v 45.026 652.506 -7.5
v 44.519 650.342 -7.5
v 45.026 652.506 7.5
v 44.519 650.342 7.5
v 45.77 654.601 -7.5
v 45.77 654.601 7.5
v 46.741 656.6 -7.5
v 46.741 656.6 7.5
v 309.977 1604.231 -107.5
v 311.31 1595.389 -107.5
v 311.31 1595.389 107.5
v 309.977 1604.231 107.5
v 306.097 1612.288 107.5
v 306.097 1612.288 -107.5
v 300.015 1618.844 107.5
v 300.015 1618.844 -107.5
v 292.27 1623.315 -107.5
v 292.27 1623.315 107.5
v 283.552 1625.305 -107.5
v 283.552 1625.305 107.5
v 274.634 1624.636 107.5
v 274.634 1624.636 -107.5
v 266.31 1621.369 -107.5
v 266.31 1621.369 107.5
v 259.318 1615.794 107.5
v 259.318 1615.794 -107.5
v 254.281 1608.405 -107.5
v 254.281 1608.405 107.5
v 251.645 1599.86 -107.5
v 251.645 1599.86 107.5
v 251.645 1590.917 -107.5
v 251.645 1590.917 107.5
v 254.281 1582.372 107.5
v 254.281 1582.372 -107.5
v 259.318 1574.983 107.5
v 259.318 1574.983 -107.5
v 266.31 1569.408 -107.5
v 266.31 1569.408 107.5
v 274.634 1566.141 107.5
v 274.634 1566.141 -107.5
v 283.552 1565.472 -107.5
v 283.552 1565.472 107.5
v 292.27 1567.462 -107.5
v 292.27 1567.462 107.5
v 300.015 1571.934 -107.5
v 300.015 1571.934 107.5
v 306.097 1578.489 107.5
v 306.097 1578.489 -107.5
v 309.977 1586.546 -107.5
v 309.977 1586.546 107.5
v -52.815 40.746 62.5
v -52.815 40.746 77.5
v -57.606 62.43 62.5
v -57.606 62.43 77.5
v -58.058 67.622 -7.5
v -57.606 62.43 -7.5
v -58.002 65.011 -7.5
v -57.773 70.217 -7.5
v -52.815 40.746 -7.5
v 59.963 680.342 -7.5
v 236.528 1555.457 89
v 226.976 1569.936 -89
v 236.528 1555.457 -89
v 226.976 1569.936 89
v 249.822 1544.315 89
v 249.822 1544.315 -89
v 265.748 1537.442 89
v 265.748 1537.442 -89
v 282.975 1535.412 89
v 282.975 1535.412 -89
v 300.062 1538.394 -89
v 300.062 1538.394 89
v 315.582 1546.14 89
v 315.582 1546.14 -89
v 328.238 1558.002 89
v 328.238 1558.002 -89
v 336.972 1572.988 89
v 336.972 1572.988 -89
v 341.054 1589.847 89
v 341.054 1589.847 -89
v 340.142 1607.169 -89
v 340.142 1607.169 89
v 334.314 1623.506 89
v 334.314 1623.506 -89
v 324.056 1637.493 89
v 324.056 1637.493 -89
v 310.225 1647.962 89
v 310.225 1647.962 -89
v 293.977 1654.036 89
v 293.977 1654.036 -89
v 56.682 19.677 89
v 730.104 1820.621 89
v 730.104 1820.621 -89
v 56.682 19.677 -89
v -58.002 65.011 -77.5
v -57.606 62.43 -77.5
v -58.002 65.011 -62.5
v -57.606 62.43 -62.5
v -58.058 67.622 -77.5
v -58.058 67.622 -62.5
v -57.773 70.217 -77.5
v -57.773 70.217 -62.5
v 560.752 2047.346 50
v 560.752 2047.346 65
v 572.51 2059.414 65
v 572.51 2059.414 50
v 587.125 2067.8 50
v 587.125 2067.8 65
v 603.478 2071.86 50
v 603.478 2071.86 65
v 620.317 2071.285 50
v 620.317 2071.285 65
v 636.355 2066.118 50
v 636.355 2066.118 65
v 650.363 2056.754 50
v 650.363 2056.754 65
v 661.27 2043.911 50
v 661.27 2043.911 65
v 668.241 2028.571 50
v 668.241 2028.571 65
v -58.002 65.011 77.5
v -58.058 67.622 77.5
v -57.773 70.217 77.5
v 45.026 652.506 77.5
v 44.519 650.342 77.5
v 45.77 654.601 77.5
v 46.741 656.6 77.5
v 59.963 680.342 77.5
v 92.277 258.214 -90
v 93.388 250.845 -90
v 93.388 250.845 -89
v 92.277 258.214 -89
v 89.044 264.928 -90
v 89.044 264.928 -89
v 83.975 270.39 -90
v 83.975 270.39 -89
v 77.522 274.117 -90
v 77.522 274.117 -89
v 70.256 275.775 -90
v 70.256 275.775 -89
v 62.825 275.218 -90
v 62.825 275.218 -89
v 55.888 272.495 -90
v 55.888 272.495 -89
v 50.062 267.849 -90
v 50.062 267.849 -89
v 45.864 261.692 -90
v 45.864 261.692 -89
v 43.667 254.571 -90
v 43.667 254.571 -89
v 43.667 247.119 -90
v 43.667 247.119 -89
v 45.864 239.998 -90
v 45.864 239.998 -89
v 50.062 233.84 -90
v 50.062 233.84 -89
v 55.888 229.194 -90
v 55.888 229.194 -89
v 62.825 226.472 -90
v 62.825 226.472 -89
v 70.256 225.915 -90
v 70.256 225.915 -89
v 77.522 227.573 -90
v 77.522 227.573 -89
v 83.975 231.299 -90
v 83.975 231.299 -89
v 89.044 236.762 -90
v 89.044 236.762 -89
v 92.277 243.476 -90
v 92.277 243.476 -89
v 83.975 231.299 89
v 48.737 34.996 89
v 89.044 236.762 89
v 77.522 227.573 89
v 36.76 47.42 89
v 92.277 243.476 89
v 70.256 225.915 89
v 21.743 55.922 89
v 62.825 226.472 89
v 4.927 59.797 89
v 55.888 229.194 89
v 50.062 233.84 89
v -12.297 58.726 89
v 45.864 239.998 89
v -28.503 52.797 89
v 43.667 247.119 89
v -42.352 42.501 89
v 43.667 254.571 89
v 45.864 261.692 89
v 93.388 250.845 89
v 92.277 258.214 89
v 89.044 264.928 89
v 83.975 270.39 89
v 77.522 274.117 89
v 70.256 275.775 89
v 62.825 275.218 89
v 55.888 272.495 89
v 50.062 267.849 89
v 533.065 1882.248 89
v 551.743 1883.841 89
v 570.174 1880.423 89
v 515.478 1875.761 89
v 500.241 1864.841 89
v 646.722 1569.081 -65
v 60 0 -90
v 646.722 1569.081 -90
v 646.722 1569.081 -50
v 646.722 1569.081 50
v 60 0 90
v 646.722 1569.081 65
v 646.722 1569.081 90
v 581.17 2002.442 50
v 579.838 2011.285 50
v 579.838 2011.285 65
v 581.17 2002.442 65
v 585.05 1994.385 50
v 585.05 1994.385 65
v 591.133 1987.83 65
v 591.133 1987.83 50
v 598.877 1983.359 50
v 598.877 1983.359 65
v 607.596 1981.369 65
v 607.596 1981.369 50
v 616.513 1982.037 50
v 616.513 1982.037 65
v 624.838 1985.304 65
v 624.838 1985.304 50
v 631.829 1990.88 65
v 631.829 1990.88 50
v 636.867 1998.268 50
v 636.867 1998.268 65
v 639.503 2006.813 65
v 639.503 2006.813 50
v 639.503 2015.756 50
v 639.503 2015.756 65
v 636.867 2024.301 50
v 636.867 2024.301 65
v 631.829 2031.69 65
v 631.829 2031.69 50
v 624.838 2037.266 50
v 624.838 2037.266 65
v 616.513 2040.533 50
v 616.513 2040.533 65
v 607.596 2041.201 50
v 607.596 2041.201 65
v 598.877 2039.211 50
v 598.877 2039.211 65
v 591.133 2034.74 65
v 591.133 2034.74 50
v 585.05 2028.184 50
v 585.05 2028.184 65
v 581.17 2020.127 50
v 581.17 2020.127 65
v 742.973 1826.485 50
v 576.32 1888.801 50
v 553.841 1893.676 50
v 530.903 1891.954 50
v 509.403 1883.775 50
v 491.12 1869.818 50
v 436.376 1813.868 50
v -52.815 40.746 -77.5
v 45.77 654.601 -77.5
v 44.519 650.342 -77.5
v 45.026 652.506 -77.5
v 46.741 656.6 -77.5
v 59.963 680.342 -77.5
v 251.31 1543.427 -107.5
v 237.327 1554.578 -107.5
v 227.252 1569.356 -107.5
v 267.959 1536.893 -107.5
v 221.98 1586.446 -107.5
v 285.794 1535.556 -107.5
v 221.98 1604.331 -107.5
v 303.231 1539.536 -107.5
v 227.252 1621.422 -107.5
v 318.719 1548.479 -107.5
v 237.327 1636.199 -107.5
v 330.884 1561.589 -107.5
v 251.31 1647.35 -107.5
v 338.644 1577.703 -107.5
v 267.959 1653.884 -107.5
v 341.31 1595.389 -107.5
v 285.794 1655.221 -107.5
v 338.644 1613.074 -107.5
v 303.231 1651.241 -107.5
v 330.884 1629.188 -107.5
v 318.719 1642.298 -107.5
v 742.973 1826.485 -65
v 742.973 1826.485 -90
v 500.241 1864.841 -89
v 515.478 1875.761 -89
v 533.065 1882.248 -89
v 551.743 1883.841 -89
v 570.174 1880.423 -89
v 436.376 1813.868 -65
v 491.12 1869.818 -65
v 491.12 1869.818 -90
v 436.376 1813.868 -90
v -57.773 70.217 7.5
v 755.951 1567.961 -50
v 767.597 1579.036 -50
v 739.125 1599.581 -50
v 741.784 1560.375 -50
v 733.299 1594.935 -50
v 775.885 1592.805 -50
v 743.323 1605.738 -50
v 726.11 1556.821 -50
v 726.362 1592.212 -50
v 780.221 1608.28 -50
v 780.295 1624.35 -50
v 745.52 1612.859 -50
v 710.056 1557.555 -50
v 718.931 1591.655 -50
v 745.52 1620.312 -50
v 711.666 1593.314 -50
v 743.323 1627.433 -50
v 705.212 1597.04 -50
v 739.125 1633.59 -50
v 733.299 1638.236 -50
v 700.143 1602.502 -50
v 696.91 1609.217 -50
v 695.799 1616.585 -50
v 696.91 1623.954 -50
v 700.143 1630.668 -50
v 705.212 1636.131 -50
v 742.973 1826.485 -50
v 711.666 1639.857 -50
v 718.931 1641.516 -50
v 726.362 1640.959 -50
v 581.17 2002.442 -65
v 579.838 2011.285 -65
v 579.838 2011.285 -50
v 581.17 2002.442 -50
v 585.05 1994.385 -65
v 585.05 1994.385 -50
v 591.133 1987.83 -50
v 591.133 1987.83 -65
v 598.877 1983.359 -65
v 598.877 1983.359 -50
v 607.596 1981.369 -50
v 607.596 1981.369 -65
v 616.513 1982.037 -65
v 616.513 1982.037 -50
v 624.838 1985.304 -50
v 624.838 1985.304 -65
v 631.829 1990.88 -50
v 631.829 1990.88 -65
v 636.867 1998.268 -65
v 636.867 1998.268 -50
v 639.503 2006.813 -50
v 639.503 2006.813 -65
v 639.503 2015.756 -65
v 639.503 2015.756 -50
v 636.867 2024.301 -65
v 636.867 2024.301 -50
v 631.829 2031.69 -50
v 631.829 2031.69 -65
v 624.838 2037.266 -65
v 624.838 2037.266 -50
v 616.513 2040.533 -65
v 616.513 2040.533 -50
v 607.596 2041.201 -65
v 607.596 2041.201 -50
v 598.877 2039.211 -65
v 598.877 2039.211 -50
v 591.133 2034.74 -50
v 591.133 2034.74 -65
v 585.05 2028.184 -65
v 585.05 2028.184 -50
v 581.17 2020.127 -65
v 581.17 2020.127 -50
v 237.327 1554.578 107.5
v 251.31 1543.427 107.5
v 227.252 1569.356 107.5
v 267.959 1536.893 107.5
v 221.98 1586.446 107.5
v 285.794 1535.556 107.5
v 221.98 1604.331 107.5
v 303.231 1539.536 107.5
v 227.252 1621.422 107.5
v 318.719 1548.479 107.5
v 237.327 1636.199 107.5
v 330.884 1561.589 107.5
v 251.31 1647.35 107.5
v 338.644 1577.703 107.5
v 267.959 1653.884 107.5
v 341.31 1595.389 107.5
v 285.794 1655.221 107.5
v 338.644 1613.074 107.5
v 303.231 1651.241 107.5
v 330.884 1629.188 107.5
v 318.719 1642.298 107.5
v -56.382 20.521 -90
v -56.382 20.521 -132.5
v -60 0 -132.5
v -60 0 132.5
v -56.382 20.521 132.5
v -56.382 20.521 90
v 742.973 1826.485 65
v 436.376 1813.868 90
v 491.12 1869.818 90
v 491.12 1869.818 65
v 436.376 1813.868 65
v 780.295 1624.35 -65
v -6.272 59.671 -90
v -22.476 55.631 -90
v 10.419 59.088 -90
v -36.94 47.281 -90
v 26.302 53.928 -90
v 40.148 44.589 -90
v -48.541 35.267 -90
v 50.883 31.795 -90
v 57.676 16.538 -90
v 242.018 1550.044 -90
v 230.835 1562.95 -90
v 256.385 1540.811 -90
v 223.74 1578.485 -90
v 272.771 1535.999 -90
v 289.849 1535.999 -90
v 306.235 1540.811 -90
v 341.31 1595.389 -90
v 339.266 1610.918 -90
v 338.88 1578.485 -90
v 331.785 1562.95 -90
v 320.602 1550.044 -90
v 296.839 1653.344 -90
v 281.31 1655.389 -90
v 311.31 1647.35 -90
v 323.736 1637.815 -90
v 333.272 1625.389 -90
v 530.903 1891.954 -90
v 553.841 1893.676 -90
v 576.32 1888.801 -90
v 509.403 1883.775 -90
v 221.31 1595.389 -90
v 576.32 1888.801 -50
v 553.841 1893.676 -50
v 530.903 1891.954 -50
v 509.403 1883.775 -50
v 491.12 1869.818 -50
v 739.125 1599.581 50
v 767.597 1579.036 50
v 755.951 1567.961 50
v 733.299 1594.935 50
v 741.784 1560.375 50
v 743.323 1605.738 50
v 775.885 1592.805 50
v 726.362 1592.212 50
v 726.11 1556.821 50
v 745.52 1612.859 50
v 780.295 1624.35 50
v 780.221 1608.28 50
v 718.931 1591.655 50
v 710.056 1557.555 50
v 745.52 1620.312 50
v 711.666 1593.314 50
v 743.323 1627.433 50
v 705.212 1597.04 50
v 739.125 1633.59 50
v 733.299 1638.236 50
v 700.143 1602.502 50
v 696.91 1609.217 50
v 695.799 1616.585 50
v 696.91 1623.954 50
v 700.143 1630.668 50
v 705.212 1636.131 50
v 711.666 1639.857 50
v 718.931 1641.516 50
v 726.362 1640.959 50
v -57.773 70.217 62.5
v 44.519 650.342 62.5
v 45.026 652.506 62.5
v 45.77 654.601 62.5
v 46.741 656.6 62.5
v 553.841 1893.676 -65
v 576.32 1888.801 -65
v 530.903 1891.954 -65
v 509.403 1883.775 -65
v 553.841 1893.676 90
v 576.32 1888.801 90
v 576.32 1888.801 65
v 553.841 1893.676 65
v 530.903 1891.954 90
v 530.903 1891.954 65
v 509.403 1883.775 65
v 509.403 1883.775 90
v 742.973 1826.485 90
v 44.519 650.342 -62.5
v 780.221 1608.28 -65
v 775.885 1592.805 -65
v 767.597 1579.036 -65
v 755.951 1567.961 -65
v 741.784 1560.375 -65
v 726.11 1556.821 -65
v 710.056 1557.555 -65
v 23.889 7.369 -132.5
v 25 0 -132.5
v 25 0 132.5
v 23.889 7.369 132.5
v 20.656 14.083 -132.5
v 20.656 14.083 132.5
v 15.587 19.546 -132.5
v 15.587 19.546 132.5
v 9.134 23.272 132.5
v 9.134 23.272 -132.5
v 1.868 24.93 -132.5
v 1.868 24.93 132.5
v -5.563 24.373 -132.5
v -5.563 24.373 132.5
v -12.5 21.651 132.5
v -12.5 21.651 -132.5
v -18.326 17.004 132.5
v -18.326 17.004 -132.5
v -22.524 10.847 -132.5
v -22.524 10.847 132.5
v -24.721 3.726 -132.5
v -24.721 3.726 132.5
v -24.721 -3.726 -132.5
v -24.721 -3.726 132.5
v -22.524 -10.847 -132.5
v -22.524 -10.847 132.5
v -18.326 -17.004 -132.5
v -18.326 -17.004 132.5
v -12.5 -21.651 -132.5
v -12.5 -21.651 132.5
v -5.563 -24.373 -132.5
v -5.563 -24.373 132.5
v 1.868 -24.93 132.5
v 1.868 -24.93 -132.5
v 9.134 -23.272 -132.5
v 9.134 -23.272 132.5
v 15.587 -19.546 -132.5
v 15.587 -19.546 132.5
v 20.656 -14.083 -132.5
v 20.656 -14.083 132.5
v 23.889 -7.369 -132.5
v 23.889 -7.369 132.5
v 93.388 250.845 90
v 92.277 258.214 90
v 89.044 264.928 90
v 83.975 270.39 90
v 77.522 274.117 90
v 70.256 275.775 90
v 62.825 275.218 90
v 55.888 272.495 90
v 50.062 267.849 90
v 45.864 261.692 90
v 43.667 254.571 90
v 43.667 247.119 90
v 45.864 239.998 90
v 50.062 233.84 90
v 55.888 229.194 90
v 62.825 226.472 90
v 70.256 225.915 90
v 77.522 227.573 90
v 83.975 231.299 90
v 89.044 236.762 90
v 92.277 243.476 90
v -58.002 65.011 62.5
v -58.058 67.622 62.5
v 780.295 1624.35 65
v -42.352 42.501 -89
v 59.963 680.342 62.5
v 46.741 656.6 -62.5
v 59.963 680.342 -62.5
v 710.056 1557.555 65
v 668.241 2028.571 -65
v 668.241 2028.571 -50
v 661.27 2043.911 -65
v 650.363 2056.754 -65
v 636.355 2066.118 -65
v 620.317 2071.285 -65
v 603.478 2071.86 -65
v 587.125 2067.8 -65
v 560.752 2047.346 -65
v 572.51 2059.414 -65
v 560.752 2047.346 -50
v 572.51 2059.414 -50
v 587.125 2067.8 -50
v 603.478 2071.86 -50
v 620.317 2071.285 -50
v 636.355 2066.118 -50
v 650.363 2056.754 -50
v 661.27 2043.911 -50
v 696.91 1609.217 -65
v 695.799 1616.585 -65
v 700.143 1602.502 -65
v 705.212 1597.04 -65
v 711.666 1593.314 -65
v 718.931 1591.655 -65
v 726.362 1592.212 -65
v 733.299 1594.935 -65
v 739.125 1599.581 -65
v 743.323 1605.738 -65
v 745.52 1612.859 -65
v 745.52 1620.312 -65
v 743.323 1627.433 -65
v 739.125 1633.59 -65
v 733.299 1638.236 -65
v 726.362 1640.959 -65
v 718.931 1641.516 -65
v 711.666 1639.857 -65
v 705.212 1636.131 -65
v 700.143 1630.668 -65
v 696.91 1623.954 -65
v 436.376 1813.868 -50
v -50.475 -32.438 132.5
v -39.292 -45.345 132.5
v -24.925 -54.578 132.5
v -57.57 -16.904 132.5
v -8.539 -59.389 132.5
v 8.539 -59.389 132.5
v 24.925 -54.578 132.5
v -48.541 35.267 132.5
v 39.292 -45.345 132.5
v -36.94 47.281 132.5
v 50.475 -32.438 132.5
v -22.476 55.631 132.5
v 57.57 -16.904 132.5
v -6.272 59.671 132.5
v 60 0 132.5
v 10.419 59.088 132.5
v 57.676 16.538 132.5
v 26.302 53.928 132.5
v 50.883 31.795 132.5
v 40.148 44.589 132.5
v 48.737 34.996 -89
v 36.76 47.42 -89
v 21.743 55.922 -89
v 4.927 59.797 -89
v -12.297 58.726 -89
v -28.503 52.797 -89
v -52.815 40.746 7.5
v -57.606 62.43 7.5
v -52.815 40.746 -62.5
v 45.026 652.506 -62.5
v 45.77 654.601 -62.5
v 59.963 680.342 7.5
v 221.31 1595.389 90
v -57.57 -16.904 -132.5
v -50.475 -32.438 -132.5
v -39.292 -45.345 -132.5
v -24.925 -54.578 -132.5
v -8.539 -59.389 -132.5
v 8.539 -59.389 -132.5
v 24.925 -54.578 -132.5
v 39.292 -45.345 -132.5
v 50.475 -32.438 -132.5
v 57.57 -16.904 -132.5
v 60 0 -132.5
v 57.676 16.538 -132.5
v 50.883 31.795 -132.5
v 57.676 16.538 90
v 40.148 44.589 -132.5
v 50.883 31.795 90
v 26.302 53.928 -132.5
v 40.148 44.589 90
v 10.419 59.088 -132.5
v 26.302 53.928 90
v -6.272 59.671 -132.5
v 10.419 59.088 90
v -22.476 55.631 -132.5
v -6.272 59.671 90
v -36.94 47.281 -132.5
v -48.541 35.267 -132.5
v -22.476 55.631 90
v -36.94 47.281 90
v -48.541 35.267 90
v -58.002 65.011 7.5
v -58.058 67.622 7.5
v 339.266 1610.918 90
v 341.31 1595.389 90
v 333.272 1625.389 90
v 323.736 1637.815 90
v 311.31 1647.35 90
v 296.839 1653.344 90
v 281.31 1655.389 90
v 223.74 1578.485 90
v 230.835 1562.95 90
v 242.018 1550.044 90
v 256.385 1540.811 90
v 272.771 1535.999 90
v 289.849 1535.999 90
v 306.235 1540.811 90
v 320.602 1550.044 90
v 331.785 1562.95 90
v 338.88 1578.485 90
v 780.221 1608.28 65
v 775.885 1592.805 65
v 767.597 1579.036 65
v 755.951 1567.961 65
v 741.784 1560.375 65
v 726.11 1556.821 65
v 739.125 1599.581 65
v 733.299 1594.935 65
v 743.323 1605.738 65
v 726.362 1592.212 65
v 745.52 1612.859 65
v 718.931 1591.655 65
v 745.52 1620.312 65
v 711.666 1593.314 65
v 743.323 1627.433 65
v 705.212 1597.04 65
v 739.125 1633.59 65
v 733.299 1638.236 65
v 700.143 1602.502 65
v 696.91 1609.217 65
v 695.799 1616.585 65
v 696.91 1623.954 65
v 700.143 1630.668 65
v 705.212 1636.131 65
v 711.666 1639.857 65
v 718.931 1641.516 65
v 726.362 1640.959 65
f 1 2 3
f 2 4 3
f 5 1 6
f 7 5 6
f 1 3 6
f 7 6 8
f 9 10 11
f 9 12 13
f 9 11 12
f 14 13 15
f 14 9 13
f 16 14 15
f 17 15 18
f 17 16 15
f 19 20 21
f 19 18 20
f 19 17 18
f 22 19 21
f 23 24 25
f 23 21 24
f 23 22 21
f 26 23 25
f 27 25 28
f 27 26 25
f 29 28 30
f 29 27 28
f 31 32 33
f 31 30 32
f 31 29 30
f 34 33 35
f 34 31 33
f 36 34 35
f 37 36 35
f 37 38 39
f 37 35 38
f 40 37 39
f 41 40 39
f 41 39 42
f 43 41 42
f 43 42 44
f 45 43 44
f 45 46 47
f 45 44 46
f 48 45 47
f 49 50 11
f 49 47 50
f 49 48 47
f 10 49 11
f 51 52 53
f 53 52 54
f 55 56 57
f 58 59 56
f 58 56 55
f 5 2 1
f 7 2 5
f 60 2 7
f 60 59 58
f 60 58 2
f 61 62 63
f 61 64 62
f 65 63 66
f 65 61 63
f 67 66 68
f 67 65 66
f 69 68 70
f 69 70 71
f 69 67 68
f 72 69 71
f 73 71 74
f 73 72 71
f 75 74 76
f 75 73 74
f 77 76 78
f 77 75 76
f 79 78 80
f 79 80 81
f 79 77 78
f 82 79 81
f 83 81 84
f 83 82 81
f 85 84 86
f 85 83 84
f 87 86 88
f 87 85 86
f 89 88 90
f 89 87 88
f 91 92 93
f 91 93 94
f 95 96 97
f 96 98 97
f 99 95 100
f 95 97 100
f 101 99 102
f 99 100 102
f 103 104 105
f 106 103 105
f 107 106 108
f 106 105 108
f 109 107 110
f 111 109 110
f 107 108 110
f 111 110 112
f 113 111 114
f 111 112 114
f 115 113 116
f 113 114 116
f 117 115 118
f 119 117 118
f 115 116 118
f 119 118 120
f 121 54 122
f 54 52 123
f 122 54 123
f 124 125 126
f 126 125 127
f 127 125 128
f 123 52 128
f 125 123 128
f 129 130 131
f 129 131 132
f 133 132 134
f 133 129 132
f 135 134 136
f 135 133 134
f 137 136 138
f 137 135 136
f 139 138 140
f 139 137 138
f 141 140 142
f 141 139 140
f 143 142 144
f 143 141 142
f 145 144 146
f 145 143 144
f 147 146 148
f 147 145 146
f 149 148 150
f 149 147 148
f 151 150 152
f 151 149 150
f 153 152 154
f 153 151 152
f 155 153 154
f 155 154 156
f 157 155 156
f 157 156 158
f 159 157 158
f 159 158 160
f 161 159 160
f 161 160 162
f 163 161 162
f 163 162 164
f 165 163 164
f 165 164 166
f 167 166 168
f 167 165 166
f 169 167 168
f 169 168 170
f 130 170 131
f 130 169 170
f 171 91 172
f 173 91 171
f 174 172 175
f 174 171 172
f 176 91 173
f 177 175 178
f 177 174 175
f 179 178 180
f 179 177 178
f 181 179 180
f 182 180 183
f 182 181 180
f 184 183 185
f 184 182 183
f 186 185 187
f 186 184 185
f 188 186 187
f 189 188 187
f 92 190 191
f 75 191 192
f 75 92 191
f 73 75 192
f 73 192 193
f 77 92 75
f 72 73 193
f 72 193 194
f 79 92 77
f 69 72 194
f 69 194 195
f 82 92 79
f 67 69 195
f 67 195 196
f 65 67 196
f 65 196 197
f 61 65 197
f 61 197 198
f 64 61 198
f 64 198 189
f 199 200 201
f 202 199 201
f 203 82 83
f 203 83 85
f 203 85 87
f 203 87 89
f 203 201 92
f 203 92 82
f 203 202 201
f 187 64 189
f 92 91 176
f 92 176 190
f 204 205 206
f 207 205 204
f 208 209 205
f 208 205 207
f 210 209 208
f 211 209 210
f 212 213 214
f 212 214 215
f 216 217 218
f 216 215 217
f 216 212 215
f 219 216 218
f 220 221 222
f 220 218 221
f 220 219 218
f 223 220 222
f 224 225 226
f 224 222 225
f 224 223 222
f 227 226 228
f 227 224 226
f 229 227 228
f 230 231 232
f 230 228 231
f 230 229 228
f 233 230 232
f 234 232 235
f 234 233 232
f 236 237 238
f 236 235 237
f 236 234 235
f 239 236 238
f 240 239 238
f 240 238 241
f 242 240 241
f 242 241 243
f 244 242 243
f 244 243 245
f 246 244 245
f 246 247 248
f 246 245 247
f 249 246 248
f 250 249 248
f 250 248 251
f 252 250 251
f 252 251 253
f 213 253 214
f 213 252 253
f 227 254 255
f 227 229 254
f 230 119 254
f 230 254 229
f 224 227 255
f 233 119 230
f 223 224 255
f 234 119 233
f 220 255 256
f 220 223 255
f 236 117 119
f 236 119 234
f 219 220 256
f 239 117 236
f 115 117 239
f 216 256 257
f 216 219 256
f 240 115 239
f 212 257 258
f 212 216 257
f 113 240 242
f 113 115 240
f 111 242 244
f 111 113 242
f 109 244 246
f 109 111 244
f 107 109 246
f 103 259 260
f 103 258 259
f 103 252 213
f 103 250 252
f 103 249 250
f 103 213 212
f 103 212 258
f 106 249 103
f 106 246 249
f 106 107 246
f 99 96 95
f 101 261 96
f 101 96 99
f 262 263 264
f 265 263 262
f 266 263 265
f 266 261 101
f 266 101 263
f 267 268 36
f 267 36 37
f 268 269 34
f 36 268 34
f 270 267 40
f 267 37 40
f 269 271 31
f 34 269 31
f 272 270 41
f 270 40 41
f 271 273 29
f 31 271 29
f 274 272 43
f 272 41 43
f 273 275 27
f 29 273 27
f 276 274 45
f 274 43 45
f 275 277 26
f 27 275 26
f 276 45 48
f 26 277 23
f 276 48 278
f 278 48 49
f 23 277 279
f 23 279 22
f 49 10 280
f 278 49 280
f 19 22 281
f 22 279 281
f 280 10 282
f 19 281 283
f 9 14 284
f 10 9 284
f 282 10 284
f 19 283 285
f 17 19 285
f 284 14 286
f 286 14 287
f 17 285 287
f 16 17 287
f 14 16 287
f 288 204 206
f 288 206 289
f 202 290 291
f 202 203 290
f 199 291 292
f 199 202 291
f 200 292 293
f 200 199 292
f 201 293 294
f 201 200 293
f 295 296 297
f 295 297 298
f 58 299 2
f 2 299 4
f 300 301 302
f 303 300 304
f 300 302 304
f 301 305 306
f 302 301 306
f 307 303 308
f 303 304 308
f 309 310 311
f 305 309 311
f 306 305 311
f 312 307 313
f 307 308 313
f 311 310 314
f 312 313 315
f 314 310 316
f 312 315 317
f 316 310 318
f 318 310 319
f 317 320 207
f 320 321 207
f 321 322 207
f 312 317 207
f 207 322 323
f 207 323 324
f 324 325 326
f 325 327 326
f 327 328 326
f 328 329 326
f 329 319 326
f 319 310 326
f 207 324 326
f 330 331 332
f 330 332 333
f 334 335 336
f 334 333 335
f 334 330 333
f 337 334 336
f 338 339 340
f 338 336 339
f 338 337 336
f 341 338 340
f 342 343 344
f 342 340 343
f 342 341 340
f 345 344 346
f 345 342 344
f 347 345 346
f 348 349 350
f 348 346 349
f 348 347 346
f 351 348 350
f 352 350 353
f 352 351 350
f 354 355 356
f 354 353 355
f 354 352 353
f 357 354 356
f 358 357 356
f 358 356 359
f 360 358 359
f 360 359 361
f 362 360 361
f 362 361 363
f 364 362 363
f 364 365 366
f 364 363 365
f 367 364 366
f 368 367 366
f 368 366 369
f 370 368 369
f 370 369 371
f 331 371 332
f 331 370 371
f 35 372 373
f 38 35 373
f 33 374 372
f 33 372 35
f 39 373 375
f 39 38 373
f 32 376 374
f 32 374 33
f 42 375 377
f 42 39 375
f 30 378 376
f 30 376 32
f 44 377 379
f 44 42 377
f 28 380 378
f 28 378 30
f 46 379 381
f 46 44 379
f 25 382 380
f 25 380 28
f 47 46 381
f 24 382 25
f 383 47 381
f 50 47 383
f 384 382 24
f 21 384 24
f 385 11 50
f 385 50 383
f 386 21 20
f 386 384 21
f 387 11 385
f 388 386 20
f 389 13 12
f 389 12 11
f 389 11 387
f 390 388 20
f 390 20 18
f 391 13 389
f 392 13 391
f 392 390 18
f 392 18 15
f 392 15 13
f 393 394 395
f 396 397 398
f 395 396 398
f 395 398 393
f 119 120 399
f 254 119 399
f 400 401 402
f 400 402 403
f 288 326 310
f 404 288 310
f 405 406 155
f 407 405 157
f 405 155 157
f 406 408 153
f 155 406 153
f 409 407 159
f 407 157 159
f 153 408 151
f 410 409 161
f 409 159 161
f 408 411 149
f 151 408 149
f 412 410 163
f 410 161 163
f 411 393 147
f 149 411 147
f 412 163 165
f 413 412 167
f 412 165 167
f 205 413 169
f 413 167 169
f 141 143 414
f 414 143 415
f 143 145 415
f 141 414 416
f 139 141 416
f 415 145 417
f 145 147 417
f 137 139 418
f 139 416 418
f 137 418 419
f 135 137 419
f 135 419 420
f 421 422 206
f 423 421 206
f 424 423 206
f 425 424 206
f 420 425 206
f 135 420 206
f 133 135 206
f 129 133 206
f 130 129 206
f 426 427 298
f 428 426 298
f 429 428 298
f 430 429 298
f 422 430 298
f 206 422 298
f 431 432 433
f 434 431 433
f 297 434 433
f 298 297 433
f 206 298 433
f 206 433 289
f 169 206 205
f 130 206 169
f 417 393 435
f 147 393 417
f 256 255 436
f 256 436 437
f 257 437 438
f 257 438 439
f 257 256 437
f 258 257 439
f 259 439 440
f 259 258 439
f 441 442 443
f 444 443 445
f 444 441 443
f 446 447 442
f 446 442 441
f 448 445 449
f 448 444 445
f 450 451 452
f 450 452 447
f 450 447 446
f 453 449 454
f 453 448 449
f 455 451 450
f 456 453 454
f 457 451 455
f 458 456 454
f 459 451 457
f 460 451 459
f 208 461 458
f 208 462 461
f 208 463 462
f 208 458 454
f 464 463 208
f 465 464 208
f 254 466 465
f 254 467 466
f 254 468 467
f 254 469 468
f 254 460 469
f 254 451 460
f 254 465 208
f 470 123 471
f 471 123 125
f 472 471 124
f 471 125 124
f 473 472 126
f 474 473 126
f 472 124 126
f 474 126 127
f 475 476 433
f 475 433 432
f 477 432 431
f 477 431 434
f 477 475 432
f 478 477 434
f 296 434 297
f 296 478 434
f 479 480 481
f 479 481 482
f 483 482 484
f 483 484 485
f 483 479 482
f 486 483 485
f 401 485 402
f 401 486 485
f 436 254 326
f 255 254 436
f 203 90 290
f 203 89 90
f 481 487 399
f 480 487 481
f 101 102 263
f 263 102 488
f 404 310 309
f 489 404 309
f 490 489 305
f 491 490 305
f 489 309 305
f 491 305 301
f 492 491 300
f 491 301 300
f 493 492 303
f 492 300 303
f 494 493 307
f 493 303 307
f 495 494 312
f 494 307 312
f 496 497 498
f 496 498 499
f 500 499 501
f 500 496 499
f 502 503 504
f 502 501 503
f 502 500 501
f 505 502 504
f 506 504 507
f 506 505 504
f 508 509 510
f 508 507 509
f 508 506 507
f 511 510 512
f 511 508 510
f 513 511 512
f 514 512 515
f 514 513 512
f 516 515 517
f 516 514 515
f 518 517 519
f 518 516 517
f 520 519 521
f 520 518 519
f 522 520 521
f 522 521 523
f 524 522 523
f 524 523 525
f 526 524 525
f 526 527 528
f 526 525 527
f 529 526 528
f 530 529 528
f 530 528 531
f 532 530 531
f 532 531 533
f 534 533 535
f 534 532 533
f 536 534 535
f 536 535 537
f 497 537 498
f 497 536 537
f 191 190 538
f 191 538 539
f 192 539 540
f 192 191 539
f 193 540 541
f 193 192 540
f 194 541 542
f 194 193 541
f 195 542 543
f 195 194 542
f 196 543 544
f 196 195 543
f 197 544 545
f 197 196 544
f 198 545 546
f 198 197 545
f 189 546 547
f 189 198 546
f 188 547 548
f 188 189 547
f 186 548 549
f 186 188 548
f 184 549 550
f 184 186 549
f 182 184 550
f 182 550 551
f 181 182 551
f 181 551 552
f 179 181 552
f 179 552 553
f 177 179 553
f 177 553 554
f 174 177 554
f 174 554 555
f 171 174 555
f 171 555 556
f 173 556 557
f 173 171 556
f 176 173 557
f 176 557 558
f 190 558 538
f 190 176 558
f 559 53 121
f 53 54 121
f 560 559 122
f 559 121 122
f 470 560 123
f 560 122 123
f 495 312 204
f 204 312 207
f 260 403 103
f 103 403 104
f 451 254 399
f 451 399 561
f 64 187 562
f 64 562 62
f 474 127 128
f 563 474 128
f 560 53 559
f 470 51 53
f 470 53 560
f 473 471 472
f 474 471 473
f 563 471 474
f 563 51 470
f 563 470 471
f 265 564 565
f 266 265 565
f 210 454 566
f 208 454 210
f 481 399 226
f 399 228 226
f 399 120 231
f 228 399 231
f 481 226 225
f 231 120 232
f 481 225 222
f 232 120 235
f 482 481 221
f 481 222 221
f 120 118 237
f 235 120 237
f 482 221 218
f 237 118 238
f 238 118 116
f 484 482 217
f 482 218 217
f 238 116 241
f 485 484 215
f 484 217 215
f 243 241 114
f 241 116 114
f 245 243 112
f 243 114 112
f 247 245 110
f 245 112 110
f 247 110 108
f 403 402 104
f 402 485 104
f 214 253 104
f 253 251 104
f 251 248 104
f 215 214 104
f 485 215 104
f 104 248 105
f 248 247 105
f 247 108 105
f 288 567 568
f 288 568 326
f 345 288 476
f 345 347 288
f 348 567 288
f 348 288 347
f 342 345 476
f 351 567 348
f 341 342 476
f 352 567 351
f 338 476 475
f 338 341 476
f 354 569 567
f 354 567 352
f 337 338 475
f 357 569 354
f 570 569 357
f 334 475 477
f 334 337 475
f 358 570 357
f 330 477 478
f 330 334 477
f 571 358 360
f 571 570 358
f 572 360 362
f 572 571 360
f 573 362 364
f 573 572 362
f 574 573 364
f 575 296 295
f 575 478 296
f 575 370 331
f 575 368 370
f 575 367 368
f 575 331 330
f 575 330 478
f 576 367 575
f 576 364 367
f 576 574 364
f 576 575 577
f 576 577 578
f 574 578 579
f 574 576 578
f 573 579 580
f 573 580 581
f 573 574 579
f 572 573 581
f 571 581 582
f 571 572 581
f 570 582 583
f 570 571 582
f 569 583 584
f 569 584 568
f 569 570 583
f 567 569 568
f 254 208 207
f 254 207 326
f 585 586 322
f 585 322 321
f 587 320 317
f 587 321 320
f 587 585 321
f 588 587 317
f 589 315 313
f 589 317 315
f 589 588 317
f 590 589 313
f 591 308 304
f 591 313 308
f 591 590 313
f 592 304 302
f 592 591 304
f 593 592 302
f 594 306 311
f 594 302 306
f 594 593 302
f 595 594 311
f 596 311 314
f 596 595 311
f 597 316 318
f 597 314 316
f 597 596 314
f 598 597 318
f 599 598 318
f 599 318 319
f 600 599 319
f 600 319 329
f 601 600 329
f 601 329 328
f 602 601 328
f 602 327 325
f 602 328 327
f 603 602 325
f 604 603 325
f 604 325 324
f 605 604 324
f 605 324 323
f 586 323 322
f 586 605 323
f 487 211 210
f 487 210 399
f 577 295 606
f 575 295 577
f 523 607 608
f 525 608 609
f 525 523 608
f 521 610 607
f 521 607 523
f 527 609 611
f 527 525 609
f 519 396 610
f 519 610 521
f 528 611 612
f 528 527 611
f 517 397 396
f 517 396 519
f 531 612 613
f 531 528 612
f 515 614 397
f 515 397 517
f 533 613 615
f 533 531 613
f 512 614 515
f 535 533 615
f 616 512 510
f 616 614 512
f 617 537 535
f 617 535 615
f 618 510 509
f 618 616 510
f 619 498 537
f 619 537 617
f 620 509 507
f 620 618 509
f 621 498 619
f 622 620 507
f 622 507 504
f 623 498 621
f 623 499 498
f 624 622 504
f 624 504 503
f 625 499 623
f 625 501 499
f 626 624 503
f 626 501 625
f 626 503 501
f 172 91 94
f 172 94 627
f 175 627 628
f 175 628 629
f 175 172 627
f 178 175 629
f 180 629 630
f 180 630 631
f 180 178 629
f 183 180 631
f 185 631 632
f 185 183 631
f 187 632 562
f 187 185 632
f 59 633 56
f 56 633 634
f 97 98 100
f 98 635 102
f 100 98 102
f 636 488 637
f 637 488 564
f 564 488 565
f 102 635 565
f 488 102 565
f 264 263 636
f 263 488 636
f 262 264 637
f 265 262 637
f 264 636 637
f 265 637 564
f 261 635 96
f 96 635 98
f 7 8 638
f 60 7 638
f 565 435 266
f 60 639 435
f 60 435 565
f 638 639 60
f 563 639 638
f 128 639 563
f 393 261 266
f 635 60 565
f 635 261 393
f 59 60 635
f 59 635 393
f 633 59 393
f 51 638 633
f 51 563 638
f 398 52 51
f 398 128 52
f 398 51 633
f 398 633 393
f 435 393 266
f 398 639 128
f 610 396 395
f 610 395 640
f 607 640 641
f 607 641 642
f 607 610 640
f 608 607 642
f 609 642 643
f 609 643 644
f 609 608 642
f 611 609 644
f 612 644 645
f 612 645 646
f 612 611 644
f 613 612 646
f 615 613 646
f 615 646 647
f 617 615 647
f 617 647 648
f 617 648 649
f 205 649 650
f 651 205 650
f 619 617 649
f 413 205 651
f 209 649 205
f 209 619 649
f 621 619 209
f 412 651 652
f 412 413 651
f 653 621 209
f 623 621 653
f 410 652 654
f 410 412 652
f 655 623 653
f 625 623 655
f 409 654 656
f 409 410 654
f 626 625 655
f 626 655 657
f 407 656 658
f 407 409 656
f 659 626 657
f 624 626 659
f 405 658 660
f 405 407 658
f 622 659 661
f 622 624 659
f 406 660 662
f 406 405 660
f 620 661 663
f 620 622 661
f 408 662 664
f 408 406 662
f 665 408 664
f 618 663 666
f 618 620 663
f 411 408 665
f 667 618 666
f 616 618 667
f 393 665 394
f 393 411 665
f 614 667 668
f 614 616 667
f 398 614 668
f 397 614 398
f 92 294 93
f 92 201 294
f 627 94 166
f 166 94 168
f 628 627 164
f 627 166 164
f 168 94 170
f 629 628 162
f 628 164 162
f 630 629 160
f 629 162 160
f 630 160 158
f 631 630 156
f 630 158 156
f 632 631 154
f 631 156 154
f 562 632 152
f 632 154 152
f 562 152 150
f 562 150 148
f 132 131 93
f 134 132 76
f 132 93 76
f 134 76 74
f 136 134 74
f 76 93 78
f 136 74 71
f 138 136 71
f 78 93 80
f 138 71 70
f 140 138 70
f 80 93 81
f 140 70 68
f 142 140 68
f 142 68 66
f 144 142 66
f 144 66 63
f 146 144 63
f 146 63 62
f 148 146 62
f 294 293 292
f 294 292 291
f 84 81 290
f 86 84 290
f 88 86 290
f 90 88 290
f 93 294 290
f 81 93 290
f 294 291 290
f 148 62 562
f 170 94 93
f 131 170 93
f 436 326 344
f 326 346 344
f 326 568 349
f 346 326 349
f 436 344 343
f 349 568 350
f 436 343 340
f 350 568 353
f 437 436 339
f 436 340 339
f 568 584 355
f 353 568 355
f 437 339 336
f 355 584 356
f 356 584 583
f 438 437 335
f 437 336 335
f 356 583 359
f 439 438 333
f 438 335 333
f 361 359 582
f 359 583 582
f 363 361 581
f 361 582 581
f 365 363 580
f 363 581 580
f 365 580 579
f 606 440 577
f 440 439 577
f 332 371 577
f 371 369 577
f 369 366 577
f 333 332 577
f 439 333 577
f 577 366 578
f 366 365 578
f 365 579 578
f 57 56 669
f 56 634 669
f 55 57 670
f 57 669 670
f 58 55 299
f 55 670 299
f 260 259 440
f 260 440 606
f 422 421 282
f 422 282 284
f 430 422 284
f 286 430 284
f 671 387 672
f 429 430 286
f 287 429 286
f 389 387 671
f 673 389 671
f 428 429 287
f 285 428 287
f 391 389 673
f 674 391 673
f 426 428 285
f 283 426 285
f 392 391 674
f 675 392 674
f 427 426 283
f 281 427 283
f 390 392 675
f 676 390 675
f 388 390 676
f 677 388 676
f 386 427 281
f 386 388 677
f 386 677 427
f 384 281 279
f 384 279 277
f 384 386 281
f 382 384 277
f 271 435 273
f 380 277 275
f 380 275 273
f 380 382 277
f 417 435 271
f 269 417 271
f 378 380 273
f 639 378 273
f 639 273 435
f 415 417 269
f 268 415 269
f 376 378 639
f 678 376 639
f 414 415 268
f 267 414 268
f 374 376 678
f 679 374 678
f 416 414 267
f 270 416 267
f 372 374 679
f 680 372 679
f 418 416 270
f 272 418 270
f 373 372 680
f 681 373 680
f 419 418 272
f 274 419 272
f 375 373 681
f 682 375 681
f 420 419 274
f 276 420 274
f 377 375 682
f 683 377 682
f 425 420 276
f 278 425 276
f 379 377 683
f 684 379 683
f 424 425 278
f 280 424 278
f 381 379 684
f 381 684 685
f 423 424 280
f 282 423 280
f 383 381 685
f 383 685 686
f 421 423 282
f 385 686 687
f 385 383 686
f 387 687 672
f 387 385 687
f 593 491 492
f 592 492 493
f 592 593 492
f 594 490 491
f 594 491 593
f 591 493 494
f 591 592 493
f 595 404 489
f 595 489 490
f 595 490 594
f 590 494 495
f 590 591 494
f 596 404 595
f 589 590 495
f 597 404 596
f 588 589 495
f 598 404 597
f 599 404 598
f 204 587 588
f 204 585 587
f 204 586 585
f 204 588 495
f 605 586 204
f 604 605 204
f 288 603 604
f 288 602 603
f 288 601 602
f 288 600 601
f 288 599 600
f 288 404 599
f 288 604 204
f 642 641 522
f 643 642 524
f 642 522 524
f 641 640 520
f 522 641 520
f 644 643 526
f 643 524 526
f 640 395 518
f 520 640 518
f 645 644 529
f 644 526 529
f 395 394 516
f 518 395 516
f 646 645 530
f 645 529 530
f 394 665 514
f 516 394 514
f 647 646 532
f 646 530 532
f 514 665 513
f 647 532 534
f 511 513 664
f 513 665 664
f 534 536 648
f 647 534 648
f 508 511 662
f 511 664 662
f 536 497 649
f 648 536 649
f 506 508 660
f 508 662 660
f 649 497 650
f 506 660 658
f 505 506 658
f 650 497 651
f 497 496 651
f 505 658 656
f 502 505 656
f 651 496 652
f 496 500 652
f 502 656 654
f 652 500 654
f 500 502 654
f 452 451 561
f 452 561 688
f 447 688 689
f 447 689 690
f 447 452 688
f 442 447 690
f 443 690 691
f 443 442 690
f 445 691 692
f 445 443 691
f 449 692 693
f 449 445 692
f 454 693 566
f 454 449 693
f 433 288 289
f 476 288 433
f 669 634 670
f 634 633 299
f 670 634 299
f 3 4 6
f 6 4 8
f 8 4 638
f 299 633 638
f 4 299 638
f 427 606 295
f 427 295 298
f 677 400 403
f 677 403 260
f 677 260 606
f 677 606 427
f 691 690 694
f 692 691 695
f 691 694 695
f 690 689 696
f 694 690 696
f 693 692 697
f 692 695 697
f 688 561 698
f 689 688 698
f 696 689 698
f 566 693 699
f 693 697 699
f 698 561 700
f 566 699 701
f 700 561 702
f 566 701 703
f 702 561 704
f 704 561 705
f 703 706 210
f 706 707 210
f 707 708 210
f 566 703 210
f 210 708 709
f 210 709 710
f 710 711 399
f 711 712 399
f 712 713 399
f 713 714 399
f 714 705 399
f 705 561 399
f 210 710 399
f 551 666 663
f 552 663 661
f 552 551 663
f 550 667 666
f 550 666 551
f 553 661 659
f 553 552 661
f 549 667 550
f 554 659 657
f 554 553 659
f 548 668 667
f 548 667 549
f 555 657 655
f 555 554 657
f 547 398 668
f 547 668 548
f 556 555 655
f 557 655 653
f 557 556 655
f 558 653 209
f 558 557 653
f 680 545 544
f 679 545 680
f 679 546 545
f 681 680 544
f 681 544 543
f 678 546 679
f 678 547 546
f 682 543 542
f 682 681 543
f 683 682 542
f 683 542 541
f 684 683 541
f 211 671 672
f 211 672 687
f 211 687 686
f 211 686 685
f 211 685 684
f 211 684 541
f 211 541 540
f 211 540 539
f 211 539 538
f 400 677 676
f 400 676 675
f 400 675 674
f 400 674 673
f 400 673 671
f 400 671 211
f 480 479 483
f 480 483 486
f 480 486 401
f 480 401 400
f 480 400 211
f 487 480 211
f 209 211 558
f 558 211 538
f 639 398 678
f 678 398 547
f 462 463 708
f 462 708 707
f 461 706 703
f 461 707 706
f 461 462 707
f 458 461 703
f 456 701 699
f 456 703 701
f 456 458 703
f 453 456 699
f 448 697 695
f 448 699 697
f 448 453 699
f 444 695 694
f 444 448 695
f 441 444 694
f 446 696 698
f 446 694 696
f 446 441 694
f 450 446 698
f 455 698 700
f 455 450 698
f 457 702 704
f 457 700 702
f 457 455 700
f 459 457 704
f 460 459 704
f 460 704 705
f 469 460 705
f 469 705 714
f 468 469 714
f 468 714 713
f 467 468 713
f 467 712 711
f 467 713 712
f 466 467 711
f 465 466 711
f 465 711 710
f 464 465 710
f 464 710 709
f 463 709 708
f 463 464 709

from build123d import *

# Parameters (mm, degrees)
BOSS_EXTRUDE7_DEPTH     = 132.5
BOSS_EXTRUDE8_DEPTH     = 107.5
BOSS_EXTRUDE11_DEPTH    = 90
BOSS_EXTRUDE13_DEPTH    = 15
BOSS_EXTRUDE14_DEPTH    = 15
CUT_EXTRUDE1_DEPTH      = 2219.3750456124794
CUT_EXTRUDE1_DEPTH_BACK = 2219.3750456124794
SKETCH9_R               = 25.00000000000001
CUT_EXTRUDE2_DEPTH      = 2219.3750456124794
CUT_EXTRUDE2_DEPTH_BACK = 2219.3750456124794
SKETCH10_R              = 25
SKETCH10_R_2            = 30.000000000000057
SKETCH10_R_3            = 25.00000000000001
CUT_EXTRUDE4_DEPTH      = 89
BOSS_EXTRUDE16_DEPTH    = 7.5
LPATTERN1_COUNT         = 2
LPATTERN1_PITCH         = 70
LPATTERN1_COUNT_DIR2    = 2
LPATTERN1_PITCH_DIR2    = 70


with BuildPart() as part:
    # Sketch1 → Boss-Extrude7 (new, symmetric)
    with BuildSketch(Plane.XY):
        with BuildLine():
            ThreePointArc((-60.00000000000001, 7.35e-15), (-1.102e-14, -60.00000000000001), (60.00000000000001, -1.47e-14))
            ThreePointArc((60.00000000000001, 0), (10.418890660014398, 59.08846518073274), (-56.3815572471555, 20.521208599537406))
            Line((-56.38155724715507, 20.5212085995373), (-60.00000000000001, 0))
        make_face()
    extrude(amount=BOSS_EXTRUDE7_DEPTH, both=True)



with BuildPart() as body_2:
    # Sketch1<4> → Boss-Extrude8 (new, symmetric)
    with BuildSketch(Plane.XY):
        with BuildLine():
            ThreePointArc((281.31004782042226, 1655.3885598797779), (238.8836409492294, 1637.8149667509708), (221.31004782042226, 1595.3885598797779))
            ThreePointArc((221.31004782042226, 1595.3885598797779), (281.31004782042226, 1535.3885598797779), (341.31004782042226, 1595.3885598797779))
            ThreePointArc((341.31004782042226, 1595.3885598797779), (323.7364546916151, 1637.8149667509706), (281.31004782042226, 1655.3885598797779))
        make_face()
    extrude(amount=BOSS_EXTRUDE8_DEPTH, both=True)


with BuildPart() as part_1:
    add(part.part)

    add(body_2.part)  # Boss-Extrude11 merges body 2
    # Sketch1<7> → Boss-Extrude11 (add, symmetric)
    with BuildSketch(Plane.XY):
        with BuildLine():
            ThreePointArc((-56.3815572471555, 20.521208599537406), (10.418890660014398, 59.08846518073274), (60.00000000000001, 0))
            Line((60.00000000000001, 0), (646.7224446980108, 1569.081173489734))
            Line((646.7224446980108, 1569.081173489734), (742.9728526854286, 1826.4851717149877))
            Line((742.9728526854286, 1826.4851717149877), (576.320357346008, 1888.8011061182426))
            ThreePointArc((576.320357346008, 1888.8011061182426), (530.9028583578195, 1891.9536301782764), (491.1198634823963, 1869.8176653013334))
            Line((491.1198634823963, 1869.8176653013334), (436.3758539114068, 1813.8683811248072))
            Line((436.3758539114068, 1813.8683811248072), (281.31004782042226, 1655.3885598797779))
            ThreePointArc((281.31004782042226, 1655.3885598797779), (323.7364546916151, 1637.8149667509706), (341.31004782042226, 1595.3885598797779))
            ThreePointArc((341.31004782042226, 1595.3885598797779), (281.31004782042226, 1535.3885598797779), (221.31004782042226, 1595.3885598797779))
            Line((221.3100478204223, 1595.3885598797783), (-56.38155724715507, 20.5212085995373))
        make_face()
    extrude(amount=BOSS_EXTRUDE11_DEPTH, both=True)

    # Sketch7 → Boss-Extrude13 (add)
    with BuildSketch(Plane.XY.offset(50)):
        with BuildLine():
            Line((491.11986348239617, 1869.8176653013334), (436.3758539114068, 1813.8683811248072))
            Line((436.3758539114068, 1813.8683811248072), (560.7517491875225, 2047.345886437859))
            ThreePointArc((560.7517491875225, 2047.345886437859), (620.3174364074071, 2071.284752328037), (668.241381159095, 2028.571336244537))
            Line((668.241381159095, 2028.571336244537), (742.9728526854286, 1826.4851717149877))
            Line((742.9728526854286, 1826.4851717149877), (576.320357346008, 1888.8011061182426))
            ThreePointArc((576.320357346008, 1888.8011061182426), (530.9028583578194, 1891.9536301782764), (491.11986348239617, 1869.8176653013334))
        make_face()
    boss_extrude13 = extrude(amount=BOSS_EXTRUDE13_DEPTH)

    # Mirror1: Boss-Extrude13 across plane
    add(boss_extrude13.mirror(Plane.XY))

    # Sketch8 → Boss-Extrude14 (add)
    with BuildSketch(Plane.XY.offset(50)):
        with BuildLine():
            Line((710.0562237456708, 1557.5550529992872), (646.722444698011, 1569.0811734897345))
            Line((646.722444698011, 1569.0811734897345), (742.9728526854286, 1826.4851717149877))
            Line((742.9728526854286, 1826.4851717149877), (780.2946008728494, 1624.3503879692228))
            ThreePointArc((780.2946008728494, 1624.3503879692228), (762.1465458997644, 1573.1067903464377), (710.0562237456708, 1557.5550529992872))
        make_face()
    boss_extrude14 = extrude(amount=BOSS_EXTRUDE14_DEPTH)

    # Mirror2: Boss-Extrude14 across plane
    add(boss_extrude14.mirror(Plane.XY))

    # Sketch9 → Cut-Extrude1 (cut, two sides: drawn at the far end of the back side and taken through both)
    with BuildSketch(Plane.XY.offset(-CUT_EXTRUDE1_DEPTH_BACK)):
        with Locations((68.38811575907259, 250.8447041954916)):
            Circle(SKETCH9_R)
    extrude(amount=CUT_EXTRUDE1_DEPTH + CUT_EXTRUDE1_DEPTH_BACK, mode=Mode.SUBTRACT)

    # Sketch10 → Cut-Extrude2 (cut, two sides: drawn at the far end of the back side and taken through both)
    with BuildSketch(Plane.XY.offset(-CUT_EXTRUDE2_DEPTH_BACK)):
        Circle(SKETCH10_R)
        with Locations((281.31004782042226, 1595.3885598797779)):
            Circle(SKETCH10_R_2)
        with Locations((609.8376069490902, 2011.284752328037)):
            Circle(SKETCH10_R_2)
        with Locations((720.7991732773353, 1616.5854607173449)):
            Circle(SKETCH10_R_3)
    extrude(amount=CUT_EXTRUDE2_DEPTH + CUT_EXTRUDE2_DEPTH_BACK, mode=Mode.SUBTRACT)

    # Sketch11 → Cut-Extrude4 (cut, symmetric)
    with BuildSketch(Plane.XY):
        with BuildLine():
            Line((-42.351656293378255, 42.50102597829323), (226.97630192688982, 1569.9357789476865))
            ThreePointArc((226.97630192688982, 1569.9357789476865), (328.2380746083149, 1558.0019272178915), (293.9773969442541, 1654.0361366939562))
            Line((293.9773969442541, 1654.0361366939562), (500.2412902493246, 1864.8412507570229))
            ThreePointArc((500.2412902493246, 1864.8412507570229), (533.0652528259412, 1882.2484835513376), (570.1744409589367, 1880.4229894000061))
            Line((570.1744409589367, 1880.4229894000061), (730.1038371756829, 1820.6210059763746))
            Line((730.1038371756829, 1820.6210059763746), (56.68161887354653, 19.677247822650788))
            ThreePointArc((56.68161887354653, 19.677247822650788), (13.474723344534803, 58.46735696769823), (-42.351656293378255, 42.50102597829323))
        make_face()
    extrude(amount=CUT_EXTRUDE4_DEPTH, both=True, mode=Mode.SUBTRACT)

    # Sketch13 → Boss-Extrude16 (add, symmetric)
    with BuildSketch(Plane.XY):
        with BuildLine():
            Line((-52.815446614608184, 40.74562699664585), (-57.6059989131423, 62.42999246636211))
            ThreePointArc((-57.6059989131423, 62.42999246636211), (-58.072295212476185, 66.31546702672539), (-57.77305039141961, 70.21736365978394))
            Line((-57.77305039141961, 70.21736365978394), (44.5186462495753, 650.3424031177195))
            ThreePointArc((44.5186462495753, 650.3424031177195), (45.368489936466986, 653.563955799229), (46.74134872827988, 656.5997250114111))
            Line((46.74134872827988, 656.5997250114111), (59.96272178968665, 680.3424031177195))
            Line((59.96272178968665, 680.3424031177195), (-52.815446614608184, 40.74562699664585))
        make_face()
    boss_extrude16 = extrude(amount=BOSS_EXTRUDE16_DEPTH, both=True)

    # LPattern1: Boss-Extrude16 2 × 2
    with Locations(*[Vector(0, 0, 1) * (i * LPATTERN1_PITCH) + Vector(0, 0, -1) * (j * LPATTERN1_PITCH_DIR2) for i in range(LPATTERN1_COUNT) for j in range(LPATTERN1_COUNT_DIR2) if (i, j) != (0, 0)]):
        add(boss_extrude16)


solid = part_1.part
